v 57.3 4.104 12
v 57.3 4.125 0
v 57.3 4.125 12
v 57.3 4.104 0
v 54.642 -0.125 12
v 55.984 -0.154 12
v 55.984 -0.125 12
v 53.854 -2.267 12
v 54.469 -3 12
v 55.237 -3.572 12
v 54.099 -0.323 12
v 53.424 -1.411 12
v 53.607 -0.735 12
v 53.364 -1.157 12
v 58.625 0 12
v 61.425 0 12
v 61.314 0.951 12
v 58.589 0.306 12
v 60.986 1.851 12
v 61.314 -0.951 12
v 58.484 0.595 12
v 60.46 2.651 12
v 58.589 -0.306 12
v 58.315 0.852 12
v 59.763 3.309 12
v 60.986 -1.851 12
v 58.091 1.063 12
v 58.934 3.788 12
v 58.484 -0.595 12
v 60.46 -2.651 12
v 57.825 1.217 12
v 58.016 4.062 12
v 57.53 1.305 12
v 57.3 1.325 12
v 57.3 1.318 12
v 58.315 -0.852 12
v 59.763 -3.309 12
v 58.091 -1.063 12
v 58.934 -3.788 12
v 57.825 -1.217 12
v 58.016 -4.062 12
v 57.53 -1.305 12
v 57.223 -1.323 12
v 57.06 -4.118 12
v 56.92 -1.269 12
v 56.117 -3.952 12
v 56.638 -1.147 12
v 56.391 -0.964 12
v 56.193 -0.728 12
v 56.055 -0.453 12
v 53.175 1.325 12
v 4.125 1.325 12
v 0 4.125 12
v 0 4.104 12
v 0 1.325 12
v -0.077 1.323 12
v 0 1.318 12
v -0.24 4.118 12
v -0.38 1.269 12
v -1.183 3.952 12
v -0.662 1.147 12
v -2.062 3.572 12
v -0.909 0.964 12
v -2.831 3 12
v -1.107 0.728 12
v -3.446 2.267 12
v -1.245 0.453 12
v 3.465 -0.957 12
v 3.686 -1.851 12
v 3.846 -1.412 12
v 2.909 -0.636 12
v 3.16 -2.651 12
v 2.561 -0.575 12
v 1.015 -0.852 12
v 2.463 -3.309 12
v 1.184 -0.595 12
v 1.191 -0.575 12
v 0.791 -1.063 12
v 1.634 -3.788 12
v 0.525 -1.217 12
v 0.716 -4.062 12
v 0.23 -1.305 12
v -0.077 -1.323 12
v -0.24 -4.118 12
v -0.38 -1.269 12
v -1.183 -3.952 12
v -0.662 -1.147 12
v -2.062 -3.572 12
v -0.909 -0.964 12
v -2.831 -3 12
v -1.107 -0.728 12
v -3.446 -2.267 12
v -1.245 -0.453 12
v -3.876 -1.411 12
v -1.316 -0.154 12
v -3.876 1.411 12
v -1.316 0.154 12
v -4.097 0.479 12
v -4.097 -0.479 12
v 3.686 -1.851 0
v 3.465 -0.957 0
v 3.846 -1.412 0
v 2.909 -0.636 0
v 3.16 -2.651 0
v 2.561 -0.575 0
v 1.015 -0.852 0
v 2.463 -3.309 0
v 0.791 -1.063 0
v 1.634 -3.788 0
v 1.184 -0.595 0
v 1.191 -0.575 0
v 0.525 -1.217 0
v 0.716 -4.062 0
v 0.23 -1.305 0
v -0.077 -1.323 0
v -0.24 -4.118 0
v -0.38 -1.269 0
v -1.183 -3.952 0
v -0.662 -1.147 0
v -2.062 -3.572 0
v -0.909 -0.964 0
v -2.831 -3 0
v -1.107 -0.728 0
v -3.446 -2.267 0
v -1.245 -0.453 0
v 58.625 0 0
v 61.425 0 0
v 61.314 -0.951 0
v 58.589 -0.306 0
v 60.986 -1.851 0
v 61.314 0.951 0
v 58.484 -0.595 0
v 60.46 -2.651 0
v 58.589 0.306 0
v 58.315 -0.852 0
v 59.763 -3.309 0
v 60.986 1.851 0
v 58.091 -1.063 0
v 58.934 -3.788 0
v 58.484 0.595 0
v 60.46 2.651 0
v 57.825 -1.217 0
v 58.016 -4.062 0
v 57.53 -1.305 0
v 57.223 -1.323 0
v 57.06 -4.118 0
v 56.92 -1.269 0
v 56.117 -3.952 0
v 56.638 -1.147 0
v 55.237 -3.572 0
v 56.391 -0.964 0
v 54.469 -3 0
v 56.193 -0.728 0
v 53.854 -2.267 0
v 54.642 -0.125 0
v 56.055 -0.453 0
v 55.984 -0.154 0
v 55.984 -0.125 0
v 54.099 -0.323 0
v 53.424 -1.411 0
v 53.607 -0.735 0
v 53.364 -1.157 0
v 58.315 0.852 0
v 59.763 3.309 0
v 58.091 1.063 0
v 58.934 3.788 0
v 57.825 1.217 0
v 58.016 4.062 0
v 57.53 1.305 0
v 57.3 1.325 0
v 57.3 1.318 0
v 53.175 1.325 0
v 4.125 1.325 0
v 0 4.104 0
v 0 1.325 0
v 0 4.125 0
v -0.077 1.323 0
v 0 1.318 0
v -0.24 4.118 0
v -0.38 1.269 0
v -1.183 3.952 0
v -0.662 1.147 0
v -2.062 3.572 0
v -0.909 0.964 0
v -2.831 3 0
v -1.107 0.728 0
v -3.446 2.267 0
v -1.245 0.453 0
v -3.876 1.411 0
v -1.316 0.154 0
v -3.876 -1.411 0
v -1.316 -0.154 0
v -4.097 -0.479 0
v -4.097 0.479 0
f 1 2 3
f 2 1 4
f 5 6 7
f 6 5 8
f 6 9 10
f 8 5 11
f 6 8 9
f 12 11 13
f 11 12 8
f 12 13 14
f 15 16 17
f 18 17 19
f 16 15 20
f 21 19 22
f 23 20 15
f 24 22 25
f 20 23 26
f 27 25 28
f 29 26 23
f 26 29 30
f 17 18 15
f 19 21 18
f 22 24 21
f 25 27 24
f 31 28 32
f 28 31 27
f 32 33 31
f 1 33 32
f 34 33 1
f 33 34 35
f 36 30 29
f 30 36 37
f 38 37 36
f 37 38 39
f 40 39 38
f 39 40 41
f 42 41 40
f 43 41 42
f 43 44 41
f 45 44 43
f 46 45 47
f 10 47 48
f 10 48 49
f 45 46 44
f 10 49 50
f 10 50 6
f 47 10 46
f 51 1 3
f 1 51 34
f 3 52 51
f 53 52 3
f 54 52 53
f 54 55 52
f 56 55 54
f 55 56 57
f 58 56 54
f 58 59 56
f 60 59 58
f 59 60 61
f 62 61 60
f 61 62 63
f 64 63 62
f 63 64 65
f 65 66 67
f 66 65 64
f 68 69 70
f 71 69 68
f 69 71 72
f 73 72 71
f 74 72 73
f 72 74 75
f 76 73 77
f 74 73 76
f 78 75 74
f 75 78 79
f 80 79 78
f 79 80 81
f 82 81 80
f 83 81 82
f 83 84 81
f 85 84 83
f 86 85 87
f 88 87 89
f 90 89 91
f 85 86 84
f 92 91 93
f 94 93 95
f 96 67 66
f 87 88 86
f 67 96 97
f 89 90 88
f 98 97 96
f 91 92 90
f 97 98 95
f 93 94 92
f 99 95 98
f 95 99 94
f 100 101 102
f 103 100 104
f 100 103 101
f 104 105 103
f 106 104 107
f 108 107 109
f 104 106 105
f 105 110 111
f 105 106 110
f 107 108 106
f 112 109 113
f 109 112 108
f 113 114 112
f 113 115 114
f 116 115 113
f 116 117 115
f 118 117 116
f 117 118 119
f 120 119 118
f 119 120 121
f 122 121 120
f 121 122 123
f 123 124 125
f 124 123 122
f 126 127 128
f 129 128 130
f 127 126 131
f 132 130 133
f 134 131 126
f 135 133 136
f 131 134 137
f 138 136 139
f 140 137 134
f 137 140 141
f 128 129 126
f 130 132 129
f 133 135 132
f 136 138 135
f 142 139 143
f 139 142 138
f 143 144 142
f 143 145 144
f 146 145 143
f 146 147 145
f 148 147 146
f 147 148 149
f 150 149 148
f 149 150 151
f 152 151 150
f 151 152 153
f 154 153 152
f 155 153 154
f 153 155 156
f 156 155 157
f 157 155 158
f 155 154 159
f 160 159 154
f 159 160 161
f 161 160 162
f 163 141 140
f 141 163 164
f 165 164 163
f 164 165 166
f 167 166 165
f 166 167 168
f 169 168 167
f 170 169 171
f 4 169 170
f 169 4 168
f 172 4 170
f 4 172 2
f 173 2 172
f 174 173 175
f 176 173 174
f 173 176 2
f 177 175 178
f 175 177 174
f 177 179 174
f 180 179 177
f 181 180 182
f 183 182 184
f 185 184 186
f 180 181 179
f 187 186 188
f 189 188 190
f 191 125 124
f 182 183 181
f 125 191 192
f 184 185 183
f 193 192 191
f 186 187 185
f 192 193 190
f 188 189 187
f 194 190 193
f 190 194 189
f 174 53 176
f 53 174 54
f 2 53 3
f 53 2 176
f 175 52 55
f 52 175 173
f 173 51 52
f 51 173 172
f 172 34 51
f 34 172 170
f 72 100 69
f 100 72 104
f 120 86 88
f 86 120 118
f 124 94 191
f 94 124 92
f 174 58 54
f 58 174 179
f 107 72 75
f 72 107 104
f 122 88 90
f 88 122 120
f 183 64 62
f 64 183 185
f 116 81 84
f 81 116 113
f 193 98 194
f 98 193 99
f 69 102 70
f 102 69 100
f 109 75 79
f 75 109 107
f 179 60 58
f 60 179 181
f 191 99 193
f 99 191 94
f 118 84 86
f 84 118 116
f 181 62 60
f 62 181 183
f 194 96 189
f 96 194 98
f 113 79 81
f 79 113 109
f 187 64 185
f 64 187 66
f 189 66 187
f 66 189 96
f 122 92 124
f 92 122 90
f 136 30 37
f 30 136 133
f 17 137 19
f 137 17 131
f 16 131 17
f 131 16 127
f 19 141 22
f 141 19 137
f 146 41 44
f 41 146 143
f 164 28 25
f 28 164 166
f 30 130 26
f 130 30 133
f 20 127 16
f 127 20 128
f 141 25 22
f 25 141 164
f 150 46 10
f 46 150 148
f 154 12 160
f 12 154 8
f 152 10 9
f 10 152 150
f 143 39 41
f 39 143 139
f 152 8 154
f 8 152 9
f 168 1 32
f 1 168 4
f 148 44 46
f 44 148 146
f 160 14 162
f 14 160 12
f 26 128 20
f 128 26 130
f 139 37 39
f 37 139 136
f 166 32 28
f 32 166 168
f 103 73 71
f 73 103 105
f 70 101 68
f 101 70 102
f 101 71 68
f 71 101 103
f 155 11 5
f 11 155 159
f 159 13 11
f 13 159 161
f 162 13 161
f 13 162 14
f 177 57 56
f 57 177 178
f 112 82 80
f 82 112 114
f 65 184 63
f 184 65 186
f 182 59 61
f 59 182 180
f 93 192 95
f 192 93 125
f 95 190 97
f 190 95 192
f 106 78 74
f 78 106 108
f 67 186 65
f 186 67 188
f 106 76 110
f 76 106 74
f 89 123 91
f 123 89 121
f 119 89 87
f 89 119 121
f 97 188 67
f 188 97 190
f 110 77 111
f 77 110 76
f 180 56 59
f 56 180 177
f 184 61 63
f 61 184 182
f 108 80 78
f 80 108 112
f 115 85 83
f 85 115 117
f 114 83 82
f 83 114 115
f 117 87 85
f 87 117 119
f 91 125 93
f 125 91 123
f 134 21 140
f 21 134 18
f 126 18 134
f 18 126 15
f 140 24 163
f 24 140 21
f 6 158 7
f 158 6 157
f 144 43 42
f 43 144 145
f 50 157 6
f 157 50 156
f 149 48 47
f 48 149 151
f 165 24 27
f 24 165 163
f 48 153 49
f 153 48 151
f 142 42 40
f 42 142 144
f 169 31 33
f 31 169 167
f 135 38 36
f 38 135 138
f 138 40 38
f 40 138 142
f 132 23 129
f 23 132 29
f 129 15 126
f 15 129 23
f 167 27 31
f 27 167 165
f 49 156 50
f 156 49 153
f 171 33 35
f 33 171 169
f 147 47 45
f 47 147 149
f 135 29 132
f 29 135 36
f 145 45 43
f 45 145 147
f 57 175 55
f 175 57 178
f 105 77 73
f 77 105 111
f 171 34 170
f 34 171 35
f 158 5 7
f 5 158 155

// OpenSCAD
// [FL_INDEX: keywords="openscad, 3d_parametric, Customizable_replacement_clip_for_folding_shopping_cart, csg_solid" | COT="Parametric OpenSCAD design from 3DCodeverse"]
// Title: Customizable replacement clip for folding shopping cart

// Distance between wires (perimeter-to-perimeter) in folded position
length = 60;
// Clip overall thickness (choose based on extrusion width; mine is 0.42 and with 2.8 Slic3r produces exactly 3+3 walls total thickness with no infill)
thickness = 2.8;

/* [Wire] */
// Diameter of wire
diameter = 2.7;
// Clip lip vertical thickness (larger makes clip harder to insert/remove; must be smaller than wire diameter, recommended setting just under diameter/4)
first_lip = 0.75;
// Clip lip vertical thickness (larger makes clip harder to insert/remove; must be smaller than wire diameter, recommended setting just under diameter/2)
second_lip = 1.2;

/* [Hidden] */

ir = (diameter - .05)/2;
thk = thickness;
l = length - diameter;
w = 12;

slack1 = first_lip;
slack2 = second_lip;

$fn = 27;

module fillet(h, r) {
  difference() {
    cube([h, r, r]);
    translate([-0.1, r, r]) rotate([0, 90, 0]) cylinder(h = h+.2, r = r, $fn=18);
  }
}

module main() {
  difference() {
    union() {
      translate([0, ir, 0]) cube([l, thk, w]);
      cylinder(r=ir+thk, h=w);
      translate([l, 0, 0]) cylinder(r=ir+thk, h=w);
    }
    translate([0, 0, -1]) cylinder(r=ir, h=w+2);
    translate([l, 0, -1]) cylinder(r=ir, h=w+2);
    translate([0, -ir+slack1, -1]) cube([ir+thk, 2*ir-slack1, w+2]);
    translate([l-ir-thk, -ir+slack2, -1]) cube([ir+thk, 2*ir-slack2, w+2]);
    translate([ir+thk, -ir+slack1+0.05, -1]) rotate([0, -90, 90]) fillet(r=0.66*thk, h=w+2);
    translate([l-ir-thk, -ir+slack2+0.05, -1]) rotate([0, -90, 180]) fillet(r=0.66*thk, h=w+2);
  }
}

main();
